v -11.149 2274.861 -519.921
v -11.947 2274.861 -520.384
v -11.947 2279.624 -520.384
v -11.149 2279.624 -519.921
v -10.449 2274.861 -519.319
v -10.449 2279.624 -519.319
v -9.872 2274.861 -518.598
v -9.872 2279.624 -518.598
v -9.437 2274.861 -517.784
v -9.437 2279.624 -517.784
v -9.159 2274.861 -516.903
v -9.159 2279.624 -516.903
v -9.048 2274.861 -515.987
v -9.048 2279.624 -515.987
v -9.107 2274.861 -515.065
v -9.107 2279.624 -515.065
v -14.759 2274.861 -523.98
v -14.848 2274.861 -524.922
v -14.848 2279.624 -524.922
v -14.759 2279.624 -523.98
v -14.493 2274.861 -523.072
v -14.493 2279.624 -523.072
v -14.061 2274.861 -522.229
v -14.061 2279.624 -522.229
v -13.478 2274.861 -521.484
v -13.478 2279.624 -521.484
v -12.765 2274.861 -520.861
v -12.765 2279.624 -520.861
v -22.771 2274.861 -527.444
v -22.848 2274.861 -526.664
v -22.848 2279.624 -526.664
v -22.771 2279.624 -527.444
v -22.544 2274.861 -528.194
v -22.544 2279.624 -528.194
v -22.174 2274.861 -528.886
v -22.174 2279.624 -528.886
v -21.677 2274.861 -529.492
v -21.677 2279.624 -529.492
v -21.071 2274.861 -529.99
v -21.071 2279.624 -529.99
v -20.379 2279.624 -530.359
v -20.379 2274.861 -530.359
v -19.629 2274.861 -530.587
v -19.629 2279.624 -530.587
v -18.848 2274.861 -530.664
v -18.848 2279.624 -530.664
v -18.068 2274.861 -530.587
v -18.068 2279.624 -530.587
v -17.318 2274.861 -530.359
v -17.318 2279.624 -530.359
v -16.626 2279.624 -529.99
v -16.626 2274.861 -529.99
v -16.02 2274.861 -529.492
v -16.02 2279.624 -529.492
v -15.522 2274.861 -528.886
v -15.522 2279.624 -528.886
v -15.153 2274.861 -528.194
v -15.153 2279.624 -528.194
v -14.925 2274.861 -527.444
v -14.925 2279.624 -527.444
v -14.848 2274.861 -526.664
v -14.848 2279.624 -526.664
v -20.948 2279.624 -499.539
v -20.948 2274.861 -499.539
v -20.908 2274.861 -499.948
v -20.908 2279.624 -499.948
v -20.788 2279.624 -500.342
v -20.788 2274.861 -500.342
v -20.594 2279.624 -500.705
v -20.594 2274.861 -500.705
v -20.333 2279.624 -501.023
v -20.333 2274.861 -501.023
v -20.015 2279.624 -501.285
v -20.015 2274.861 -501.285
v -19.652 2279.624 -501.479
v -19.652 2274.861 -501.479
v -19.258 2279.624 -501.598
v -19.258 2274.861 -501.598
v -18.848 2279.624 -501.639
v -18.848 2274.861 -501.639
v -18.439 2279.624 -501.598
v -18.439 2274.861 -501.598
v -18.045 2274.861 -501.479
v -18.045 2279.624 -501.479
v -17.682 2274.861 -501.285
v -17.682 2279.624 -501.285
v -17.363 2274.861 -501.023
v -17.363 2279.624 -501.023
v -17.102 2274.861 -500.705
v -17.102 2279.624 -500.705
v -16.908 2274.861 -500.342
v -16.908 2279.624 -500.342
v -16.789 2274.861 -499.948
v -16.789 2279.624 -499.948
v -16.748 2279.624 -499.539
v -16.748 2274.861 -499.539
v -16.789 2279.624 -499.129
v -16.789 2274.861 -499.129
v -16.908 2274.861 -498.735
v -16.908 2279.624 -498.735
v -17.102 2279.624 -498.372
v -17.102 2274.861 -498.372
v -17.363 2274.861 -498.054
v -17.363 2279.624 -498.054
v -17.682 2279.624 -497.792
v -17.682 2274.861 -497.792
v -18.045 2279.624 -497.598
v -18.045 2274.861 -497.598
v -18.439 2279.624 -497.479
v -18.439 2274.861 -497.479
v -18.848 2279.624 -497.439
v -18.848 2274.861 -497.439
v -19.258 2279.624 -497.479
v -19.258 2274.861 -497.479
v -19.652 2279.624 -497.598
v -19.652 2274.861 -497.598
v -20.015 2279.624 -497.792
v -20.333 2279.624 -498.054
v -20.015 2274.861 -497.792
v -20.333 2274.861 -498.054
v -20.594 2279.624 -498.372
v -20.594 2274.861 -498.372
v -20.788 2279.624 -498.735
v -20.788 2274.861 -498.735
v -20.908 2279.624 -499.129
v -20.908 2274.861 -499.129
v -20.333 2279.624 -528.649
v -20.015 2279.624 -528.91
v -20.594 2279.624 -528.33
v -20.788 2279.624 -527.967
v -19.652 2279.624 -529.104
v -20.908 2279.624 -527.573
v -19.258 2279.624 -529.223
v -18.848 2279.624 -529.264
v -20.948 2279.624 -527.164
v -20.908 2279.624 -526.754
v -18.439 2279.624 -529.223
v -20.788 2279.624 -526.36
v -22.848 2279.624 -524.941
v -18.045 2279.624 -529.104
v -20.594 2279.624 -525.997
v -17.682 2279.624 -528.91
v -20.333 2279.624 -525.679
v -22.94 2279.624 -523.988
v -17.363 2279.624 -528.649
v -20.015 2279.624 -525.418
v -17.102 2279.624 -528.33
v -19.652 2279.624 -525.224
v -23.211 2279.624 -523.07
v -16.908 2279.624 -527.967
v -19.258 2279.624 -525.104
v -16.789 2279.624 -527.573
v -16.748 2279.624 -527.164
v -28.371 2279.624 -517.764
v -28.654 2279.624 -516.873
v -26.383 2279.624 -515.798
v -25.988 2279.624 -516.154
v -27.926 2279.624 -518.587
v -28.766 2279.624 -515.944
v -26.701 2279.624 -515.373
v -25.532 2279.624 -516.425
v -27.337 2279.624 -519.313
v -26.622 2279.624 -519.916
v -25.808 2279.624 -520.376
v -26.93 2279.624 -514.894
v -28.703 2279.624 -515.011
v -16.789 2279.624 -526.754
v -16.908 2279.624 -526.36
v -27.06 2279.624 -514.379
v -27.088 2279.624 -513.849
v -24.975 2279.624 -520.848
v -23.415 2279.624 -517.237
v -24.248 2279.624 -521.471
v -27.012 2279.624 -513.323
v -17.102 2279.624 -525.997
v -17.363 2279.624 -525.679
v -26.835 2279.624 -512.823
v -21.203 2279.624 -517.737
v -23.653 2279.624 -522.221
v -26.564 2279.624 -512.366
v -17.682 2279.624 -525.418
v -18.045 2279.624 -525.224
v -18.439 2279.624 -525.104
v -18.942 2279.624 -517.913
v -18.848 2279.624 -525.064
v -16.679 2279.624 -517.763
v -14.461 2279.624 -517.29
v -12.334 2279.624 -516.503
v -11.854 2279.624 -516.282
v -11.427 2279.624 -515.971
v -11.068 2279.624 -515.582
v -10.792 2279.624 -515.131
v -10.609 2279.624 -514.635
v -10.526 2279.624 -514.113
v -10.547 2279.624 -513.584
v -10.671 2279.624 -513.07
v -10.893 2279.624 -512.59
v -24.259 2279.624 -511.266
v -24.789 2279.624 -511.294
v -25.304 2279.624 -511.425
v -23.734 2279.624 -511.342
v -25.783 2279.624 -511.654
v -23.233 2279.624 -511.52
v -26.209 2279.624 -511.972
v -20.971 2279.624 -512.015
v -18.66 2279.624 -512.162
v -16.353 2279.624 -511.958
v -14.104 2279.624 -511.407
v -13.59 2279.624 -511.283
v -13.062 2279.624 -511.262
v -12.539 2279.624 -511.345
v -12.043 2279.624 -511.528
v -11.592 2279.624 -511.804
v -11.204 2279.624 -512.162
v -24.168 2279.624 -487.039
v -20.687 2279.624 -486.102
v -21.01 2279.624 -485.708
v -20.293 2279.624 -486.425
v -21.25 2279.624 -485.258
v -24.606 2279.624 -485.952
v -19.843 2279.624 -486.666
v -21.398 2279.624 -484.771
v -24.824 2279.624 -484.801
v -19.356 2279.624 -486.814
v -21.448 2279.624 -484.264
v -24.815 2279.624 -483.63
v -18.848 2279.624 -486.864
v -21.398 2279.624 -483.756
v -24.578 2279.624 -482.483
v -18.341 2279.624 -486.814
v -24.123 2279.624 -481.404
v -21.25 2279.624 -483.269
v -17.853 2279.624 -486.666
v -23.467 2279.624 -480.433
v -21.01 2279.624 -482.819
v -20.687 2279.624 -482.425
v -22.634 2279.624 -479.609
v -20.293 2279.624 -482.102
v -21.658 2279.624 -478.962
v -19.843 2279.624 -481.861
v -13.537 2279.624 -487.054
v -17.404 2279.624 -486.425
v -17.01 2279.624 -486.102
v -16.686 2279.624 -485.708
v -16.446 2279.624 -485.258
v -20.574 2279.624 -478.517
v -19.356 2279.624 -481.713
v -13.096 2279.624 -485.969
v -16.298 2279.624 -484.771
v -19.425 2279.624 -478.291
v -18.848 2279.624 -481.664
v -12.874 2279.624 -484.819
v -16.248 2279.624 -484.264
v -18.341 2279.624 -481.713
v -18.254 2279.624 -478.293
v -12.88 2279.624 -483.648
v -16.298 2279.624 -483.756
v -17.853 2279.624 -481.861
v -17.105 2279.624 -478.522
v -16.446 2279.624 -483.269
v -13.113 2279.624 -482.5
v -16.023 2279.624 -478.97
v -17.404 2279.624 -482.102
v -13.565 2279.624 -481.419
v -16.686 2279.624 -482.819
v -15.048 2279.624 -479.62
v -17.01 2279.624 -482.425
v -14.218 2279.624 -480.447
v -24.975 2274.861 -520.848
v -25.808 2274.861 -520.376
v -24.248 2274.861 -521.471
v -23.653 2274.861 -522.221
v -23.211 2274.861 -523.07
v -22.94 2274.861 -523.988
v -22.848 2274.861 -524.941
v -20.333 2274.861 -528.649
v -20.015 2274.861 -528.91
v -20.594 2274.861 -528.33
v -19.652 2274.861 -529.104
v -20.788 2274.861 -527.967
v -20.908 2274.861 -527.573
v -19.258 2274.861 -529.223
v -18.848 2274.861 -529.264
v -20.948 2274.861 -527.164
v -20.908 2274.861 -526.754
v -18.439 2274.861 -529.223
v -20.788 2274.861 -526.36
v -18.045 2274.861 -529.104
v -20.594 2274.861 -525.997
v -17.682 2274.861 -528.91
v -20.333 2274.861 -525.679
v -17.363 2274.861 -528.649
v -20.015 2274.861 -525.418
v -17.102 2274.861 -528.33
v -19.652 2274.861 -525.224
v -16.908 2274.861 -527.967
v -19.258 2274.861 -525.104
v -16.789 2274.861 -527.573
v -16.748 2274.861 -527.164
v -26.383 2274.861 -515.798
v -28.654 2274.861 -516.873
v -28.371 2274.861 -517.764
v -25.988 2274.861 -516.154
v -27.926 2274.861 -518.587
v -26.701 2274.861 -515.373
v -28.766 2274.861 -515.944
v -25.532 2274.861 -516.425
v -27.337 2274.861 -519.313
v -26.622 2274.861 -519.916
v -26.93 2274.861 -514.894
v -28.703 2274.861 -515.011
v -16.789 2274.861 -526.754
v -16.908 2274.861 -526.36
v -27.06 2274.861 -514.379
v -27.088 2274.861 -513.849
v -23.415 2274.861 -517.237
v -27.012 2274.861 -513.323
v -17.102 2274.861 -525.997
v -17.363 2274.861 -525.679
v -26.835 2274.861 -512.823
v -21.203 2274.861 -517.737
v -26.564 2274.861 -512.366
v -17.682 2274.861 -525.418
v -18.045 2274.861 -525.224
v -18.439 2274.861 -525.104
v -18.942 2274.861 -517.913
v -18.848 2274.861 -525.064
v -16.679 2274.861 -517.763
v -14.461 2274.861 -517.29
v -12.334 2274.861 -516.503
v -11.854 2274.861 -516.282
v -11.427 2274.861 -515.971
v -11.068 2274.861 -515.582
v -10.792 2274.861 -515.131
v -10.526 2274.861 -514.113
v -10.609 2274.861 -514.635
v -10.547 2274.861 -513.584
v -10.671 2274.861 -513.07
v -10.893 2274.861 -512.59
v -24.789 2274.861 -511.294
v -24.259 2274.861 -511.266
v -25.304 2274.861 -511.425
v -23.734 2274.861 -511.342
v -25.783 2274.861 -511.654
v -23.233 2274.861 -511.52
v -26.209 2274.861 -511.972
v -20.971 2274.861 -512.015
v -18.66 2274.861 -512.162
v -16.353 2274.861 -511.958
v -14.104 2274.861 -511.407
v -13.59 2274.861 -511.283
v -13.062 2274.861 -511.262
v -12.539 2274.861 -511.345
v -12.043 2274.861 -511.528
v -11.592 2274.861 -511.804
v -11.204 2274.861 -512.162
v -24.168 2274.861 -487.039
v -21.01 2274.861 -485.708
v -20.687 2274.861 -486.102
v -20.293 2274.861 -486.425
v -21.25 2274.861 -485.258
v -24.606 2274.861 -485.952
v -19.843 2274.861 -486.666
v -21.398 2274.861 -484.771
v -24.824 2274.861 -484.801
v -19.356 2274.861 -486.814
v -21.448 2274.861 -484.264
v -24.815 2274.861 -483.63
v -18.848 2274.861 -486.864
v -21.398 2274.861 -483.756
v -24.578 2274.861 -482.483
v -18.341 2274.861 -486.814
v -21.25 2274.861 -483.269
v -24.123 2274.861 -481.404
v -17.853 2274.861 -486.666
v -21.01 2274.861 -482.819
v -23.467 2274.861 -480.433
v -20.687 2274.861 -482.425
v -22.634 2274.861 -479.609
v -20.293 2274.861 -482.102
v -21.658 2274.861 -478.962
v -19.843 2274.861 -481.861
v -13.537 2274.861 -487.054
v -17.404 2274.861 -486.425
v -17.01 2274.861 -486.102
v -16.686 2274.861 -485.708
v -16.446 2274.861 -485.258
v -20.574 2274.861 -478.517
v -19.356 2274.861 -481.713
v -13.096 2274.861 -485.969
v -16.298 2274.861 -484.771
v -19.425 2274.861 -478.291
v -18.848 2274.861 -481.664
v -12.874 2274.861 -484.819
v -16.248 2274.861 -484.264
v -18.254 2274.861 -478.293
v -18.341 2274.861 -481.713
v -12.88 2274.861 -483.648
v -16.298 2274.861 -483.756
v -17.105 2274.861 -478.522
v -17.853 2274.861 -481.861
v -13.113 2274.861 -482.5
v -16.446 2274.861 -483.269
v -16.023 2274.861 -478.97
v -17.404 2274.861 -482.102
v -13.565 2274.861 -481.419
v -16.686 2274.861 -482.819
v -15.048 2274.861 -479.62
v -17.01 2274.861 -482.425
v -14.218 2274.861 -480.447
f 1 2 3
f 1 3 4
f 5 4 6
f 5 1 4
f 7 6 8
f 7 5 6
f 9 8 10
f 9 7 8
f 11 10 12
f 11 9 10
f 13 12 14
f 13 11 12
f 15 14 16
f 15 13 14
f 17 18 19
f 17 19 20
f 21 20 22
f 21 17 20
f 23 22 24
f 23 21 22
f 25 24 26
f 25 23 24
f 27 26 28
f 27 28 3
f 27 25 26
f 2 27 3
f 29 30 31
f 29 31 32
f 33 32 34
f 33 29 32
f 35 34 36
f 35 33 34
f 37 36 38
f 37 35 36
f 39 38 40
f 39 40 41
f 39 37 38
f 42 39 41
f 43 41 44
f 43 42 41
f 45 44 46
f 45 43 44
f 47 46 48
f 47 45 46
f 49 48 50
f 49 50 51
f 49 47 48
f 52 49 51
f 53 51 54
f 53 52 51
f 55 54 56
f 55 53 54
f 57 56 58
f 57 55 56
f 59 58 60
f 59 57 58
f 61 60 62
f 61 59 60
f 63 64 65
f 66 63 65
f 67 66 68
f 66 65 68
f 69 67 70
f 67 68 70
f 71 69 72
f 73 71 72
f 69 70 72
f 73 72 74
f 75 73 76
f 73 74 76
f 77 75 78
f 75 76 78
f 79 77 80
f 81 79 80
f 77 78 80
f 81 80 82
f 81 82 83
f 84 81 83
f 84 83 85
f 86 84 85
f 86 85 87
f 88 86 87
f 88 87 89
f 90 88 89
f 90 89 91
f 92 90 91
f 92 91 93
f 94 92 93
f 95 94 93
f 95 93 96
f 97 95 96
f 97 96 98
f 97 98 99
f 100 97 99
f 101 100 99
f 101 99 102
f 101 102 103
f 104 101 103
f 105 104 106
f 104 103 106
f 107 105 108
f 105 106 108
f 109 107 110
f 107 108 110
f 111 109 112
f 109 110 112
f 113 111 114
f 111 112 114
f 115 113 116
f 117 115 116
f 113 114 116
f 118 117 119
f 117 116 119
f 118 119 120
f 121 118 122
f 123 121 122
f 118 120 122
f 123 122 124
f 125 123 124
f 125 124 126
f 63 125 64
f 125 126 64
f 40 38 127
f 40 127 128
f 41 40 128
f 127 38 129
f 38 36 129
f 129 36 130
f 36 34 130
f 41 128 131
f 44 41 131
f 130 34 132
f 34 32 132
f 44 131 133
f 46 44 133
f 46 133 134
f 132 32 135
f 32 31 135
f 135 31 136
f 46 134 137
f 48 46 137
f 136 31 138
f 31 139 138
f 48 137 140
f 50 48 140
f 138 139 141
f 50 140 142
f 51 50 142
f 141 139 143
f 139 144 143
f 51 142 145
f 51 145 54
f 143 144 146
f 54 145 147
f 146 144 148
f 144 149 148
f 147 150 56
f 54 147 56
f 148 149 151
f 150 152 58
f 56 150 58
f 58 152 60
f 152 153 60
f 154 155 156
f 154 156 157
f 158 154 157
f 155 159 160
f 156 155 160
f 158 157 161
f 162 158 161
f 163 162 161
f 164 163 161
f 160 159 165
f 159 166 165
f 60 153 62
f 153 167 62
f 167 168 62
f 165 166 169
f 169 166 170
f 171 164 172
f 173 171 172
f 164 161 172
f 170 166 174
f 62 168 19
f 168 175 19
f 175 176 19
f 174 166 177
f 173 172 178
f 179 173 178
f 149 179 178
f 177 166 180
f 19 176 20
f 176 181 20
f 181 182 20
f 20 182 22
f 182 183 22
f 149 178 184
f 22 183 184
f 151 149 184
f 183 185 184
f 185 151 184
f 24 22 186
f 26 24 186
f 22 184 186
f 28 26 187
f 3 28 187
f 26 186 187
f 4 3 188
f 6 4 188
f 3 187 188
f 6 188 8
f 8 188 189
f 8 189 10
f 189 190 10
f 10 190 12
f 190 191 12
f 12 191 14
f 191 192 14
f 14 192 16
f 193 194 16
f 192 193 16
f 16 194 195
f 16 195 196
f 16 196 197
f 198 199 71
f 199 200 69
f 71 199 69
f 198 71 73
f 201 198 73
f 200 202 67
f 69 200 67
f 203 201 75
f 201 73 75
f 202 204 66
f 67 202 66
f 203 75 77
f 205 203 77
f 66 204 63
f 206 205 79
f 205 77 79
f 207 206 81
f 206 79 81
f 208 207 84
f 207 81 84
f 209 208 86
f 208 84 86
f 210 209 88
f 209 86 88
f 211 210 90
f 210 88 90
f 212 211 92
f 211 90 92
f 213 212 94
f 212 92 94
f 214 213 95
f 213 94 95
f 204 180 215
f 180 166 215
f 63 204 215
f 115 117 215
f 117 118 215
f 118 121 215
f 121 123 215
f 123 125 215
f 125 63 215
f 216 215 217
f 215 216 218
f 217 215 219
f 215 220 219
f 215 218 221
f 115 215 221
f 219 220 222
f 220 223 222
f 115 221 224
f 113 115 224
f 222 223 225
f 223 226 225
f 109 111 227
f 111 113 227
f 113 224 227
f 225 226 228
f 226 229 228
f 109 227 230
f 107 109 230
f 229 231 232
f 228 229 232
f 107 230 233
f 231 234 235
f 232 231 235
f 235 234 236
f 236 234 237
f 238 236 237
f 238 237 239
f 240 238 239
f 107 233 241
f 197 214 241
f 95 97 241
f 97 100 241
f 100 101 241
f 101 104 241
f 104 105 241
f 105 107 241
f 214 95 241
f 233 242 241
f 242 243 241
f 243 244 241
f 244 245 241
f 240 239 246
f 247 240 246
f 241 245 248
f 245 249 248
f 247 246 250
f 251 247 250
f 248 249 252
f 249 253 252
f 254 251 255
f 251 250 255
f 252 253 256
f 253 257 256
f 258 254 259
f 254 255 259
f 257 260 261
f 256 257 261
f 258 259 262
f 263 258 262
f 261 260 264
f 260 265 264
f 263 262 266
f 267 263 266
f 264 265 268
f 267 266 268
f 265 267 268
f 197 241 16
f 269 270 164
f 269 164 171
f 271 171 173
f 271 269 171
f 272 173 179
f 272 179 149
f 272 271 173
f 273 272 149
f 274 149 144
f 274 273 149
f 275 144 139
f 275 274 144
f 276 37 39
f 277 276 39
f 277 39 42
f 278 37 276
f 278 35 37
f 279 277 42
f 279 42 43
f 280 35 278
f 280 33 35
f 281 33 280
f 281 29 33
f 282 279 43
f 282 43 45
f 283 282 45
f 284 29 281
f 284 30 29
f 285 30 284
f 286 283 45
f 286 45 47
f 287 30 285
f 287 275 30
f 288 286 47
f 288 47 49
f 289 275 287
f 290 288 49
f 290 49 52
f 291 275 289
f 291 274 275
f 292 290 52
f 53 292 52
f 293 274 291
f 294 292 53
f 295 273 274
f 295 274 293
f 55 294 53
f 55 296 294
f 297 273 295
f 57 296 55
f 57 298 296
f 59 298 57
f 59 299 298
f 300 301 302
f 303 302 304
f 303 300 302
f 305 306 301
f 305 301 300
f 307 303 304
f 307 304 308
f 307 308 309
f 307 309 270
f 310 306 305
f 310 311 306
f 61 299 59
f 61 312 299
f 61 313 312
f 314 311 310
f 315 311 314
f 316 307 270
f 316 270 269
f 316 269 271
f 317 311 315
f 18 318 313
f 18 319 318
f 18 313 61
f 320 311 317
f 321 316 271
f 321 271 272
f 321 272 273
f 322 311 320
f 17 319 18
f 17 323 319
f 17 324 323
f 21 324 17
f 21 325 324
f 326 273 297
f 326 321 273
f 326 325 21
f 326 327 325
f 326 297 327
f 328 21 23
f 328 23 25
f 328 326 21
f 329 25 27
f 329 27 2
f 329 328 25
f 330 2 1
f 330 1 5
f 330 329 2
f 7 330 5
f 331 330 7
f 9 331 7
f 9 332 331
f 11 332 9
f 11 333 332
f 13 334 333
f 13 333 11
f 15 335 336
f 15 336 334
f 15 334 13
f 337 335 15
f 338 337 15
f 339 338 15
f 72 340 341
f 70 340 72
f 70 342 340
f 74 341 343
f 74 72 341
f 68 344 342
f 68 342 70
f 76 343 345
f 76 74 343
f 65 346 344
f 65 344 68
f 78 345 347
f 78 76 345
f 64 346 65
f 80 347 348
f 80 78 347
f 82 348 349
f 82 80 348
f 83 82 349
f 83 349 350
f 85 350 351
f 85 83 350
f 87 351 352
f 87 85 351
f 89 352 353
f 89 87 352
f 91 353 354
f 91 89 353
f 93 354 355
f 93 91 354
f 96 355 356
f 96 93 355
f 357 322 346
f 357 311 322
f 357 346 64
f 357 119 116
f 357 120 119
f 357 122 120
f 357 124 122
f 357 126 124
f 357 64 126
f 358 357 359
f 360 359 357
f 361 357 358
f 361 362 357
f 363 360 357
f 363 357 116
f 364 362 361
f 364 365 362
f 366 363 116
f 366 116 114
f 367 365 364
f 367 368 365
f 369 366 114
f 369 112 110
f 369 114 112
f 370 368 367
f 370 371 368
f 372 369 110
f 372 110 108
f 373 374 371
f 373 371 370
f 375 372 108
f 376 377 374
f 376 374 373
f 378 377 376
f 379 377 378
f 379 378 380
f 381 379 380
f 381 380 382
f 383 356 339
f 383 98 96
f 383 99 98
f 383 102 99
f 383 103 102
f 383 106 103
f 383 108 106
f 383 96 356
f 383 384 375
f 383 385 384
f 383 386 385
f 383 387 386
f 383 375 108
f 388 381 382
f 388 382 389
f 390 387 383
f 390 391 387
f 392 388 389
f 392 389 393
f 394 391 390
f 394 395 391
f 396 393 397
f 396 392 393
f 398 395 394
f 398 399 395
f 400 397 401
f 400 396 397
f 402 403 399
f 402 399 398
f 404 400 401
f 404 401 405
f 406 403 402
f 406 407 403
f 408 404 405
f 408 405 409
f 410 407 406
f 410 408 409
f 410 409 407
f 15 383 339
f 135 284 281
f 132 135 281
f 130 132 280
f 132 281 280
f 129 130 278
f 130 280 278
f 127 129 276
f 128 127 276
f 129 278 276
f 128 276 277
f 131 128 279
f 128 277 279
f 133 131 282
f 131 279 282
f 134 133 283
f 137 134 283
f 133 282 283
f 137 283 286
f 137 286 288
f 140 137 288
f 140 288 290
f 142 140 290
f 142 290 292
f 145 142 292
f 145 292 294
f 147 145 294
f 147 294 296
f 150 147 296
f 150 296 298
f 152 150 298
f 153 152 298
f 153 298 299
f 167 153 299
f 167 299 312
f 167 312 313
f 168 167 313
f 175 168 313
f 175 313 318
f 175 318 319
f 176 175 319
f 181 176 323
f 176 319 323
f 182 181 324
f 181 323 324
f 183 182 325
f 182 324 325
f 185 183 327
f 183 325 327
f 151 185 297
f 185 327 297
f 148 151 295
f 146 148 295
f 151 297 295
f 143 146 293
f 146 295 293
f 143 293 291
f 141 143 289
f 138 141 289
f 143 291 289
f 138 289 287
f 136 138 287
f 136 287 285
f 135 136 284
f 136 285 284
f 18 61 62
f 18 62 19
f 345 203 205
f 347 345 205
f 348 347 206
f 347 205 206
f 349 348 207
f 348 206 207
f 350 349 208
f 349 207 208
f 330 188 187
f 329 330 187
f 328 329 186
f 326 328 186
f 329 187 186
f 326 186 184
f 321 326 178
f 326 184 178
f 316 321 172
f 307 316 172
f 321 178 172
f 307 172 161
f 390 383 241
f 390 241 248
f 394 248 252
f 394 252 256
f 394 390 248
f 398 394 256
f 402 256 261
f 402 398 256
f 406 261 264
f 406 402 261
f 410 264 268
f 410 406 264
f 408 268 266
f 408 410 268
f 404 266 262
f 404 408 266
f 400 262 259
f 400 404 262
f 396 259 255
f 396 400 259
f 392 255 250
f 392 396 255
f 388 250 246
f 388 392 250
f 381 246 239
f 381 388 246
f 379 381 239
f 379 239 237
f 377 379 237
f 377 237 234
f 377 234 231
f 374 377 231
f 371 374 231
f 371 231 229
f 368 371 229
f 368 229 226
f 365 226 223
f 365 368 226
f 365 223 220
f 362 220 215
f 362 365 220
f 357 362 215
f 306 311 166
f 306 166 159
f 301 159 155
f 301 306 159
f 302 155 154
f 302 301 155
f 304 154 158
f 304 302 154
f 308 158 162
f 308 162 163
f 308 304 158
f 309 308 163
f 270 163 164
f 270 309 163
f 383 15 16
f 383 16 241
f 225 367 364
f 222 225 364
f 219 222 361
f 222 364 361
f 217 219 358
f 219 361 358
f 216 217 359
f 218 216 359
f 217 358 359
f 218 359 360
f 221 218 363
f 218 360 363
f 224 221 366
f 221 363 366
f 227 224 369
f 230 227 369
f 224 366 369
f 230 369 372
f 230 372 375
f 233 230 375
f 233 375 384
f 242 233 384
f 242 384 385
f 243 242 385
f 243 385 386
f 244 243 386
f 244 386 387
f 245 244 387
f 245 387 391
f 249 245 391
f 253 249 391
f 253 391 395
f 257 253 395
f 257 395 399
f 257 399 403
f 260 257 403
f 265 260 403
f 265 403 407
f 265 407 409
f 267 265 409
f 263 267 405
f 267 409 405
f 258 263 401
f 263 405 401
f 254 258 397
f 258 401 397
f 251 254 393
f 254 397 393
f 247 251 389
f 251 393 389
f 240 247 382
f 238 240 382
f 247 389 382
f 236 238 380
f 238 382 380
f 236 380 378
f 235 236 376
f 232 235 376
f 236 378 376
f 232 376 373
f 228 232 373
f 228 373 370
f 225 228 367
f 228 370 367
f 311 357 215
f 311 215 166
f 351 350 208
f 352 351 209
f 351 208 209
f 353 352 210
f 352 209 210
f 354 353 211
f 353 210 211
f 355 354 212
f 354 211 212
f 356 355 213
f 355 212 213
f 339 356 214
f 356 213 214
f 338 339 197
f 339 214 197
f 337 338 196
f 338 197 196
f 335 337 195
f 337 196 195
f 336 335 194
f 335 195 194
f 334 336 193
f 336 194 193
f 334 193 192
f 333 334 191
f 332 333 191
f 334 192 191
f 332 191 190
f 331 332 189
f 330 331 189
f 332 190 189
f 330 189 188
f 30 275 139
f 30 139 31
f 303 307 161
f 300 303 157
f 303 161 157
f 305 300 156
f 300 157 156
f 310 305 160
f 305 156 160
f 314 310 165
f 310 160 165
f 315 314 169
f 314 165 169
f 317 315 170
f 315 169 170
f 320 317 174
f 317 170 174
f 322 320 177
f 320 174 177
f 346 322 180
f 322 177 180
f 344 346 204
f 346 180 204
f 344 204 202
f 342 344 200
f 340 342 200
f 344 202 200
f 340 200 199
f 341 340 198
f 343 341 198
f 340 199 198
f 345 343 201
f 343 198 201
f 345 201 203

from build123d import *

# Parameters (mm, degrees)
BASE_FLANGE1_DEPTH         = 4.7625
CUT_EXTRUDE1_DEPTH         = 532.464280138
F_5_2_5_2_DIAMETER_HOLE1_D = 5.2
F_4_2_4_2_DIAMETER_HOLE1_D = 4.2


# Sheet-metal steps are written as plain solids
with BuildPart() as part:
    # Sketch11 → Base-Flange1 (new body)
    with BuildSketch(Plane.XZ.offset(-2274.861409739)):
        with BuildLine():
            Line((-14.848279171, -526.663757324), (-14.848279171, -524.922409256))
            ThreePointArc((-14.848279171, -524.922409256), (-14.061019769, -522.229303864), (-11.947152511, -520.384267488))
            ThreePointArc((-11.947152511, -520.384267488), (-9.635257269, -518.200933677), (-9.1073955, -515.065145404))
            Line((-9.1073955, -515.065145404), (-13.536920305, -487.054470663))
            ThreePointArc((-13.536920305, -487.054470663), (-18.839332617, -478.263515672), (-24.167937573, -487.038618817))
            Line((-24.167937573, -487.038618817), (-28.703176429, -515.010971128))
            ThreePointArc((-28.703176429, -515.010971128), (-28.167792512, -518.185746554), (-25.8079527, -520.375949969))
            ThreePointArc((-25.8079527, -520.375949969), (-23.652946505, -522.220569615), (-22.848279171, -524.940713697))
            Line((-22.848279171, -524.940713697), (-22.848279171, -526.663757324))
            ThreePointArc((-22.848279171, -526.663757324), (-18.848279171, -530.663757324), (-14.848279171, -526.663757324))
        make_face()
    extrude(amount=-BASE_FLANGE1_DEPTH)

    # Sketch16 → Cut-Extrude1 (cut, through all)
    with BuildSketch(Plane(origin=(0, 2279.623909739, 0), x_dir=(-1, 0, 0), z_dir=(0, 1, 0))):
        with BuildLine():
            ThreePointArc((23.232934356, -511.51957962), (18.659918541, -512.162345688), (14.104175105, -511.406816996))
            ThreePointArc((14.104175105, -511.406816996), (10.671023737, -513.070256662), (12.334463403, -516.50340803))
            ThreePointArc((12.334463403, -516.50340803), (18.94176187, -517.91323157), (25.531859334, -516.425074701))
            ThreePointArc((25.531859334, -516.425074701), (26.835144386, -512.822864672), (23.232934356, -511.51957962))
        make_face()
    extrude(amount=-CUT_EXTRUDE1_DEPTH, mode=Mode.SUBTRACT)

    # Ø5.2 (5.2) Diameter Hole1 (through all)
    with Locations(Plane(origin=(0, 2279.623909739, 0), x_dir=(1, 0, 0), z_dir=(0, 1, 0))):
        with Locations((-18.848279171, 484.263509002)):
            Hole(F_5_2_5_2_DIAMETER_HOLE1_D / 2)

    # Ø4.2 (4.2) Diameter Hole1 (through all)
    with Locations(Plane(origin=(0, 2279.623909739, 0), x_dir=(1, 0, 0), z_dir=(0, 1, 0))):
        with Locations((-18.848279171, 499.538509002), (-18.848279171, 527.163757324)):
            Hole(F_4_2_4_2_DIAMETER_HOLE1_D / 2)


solid = part.part
